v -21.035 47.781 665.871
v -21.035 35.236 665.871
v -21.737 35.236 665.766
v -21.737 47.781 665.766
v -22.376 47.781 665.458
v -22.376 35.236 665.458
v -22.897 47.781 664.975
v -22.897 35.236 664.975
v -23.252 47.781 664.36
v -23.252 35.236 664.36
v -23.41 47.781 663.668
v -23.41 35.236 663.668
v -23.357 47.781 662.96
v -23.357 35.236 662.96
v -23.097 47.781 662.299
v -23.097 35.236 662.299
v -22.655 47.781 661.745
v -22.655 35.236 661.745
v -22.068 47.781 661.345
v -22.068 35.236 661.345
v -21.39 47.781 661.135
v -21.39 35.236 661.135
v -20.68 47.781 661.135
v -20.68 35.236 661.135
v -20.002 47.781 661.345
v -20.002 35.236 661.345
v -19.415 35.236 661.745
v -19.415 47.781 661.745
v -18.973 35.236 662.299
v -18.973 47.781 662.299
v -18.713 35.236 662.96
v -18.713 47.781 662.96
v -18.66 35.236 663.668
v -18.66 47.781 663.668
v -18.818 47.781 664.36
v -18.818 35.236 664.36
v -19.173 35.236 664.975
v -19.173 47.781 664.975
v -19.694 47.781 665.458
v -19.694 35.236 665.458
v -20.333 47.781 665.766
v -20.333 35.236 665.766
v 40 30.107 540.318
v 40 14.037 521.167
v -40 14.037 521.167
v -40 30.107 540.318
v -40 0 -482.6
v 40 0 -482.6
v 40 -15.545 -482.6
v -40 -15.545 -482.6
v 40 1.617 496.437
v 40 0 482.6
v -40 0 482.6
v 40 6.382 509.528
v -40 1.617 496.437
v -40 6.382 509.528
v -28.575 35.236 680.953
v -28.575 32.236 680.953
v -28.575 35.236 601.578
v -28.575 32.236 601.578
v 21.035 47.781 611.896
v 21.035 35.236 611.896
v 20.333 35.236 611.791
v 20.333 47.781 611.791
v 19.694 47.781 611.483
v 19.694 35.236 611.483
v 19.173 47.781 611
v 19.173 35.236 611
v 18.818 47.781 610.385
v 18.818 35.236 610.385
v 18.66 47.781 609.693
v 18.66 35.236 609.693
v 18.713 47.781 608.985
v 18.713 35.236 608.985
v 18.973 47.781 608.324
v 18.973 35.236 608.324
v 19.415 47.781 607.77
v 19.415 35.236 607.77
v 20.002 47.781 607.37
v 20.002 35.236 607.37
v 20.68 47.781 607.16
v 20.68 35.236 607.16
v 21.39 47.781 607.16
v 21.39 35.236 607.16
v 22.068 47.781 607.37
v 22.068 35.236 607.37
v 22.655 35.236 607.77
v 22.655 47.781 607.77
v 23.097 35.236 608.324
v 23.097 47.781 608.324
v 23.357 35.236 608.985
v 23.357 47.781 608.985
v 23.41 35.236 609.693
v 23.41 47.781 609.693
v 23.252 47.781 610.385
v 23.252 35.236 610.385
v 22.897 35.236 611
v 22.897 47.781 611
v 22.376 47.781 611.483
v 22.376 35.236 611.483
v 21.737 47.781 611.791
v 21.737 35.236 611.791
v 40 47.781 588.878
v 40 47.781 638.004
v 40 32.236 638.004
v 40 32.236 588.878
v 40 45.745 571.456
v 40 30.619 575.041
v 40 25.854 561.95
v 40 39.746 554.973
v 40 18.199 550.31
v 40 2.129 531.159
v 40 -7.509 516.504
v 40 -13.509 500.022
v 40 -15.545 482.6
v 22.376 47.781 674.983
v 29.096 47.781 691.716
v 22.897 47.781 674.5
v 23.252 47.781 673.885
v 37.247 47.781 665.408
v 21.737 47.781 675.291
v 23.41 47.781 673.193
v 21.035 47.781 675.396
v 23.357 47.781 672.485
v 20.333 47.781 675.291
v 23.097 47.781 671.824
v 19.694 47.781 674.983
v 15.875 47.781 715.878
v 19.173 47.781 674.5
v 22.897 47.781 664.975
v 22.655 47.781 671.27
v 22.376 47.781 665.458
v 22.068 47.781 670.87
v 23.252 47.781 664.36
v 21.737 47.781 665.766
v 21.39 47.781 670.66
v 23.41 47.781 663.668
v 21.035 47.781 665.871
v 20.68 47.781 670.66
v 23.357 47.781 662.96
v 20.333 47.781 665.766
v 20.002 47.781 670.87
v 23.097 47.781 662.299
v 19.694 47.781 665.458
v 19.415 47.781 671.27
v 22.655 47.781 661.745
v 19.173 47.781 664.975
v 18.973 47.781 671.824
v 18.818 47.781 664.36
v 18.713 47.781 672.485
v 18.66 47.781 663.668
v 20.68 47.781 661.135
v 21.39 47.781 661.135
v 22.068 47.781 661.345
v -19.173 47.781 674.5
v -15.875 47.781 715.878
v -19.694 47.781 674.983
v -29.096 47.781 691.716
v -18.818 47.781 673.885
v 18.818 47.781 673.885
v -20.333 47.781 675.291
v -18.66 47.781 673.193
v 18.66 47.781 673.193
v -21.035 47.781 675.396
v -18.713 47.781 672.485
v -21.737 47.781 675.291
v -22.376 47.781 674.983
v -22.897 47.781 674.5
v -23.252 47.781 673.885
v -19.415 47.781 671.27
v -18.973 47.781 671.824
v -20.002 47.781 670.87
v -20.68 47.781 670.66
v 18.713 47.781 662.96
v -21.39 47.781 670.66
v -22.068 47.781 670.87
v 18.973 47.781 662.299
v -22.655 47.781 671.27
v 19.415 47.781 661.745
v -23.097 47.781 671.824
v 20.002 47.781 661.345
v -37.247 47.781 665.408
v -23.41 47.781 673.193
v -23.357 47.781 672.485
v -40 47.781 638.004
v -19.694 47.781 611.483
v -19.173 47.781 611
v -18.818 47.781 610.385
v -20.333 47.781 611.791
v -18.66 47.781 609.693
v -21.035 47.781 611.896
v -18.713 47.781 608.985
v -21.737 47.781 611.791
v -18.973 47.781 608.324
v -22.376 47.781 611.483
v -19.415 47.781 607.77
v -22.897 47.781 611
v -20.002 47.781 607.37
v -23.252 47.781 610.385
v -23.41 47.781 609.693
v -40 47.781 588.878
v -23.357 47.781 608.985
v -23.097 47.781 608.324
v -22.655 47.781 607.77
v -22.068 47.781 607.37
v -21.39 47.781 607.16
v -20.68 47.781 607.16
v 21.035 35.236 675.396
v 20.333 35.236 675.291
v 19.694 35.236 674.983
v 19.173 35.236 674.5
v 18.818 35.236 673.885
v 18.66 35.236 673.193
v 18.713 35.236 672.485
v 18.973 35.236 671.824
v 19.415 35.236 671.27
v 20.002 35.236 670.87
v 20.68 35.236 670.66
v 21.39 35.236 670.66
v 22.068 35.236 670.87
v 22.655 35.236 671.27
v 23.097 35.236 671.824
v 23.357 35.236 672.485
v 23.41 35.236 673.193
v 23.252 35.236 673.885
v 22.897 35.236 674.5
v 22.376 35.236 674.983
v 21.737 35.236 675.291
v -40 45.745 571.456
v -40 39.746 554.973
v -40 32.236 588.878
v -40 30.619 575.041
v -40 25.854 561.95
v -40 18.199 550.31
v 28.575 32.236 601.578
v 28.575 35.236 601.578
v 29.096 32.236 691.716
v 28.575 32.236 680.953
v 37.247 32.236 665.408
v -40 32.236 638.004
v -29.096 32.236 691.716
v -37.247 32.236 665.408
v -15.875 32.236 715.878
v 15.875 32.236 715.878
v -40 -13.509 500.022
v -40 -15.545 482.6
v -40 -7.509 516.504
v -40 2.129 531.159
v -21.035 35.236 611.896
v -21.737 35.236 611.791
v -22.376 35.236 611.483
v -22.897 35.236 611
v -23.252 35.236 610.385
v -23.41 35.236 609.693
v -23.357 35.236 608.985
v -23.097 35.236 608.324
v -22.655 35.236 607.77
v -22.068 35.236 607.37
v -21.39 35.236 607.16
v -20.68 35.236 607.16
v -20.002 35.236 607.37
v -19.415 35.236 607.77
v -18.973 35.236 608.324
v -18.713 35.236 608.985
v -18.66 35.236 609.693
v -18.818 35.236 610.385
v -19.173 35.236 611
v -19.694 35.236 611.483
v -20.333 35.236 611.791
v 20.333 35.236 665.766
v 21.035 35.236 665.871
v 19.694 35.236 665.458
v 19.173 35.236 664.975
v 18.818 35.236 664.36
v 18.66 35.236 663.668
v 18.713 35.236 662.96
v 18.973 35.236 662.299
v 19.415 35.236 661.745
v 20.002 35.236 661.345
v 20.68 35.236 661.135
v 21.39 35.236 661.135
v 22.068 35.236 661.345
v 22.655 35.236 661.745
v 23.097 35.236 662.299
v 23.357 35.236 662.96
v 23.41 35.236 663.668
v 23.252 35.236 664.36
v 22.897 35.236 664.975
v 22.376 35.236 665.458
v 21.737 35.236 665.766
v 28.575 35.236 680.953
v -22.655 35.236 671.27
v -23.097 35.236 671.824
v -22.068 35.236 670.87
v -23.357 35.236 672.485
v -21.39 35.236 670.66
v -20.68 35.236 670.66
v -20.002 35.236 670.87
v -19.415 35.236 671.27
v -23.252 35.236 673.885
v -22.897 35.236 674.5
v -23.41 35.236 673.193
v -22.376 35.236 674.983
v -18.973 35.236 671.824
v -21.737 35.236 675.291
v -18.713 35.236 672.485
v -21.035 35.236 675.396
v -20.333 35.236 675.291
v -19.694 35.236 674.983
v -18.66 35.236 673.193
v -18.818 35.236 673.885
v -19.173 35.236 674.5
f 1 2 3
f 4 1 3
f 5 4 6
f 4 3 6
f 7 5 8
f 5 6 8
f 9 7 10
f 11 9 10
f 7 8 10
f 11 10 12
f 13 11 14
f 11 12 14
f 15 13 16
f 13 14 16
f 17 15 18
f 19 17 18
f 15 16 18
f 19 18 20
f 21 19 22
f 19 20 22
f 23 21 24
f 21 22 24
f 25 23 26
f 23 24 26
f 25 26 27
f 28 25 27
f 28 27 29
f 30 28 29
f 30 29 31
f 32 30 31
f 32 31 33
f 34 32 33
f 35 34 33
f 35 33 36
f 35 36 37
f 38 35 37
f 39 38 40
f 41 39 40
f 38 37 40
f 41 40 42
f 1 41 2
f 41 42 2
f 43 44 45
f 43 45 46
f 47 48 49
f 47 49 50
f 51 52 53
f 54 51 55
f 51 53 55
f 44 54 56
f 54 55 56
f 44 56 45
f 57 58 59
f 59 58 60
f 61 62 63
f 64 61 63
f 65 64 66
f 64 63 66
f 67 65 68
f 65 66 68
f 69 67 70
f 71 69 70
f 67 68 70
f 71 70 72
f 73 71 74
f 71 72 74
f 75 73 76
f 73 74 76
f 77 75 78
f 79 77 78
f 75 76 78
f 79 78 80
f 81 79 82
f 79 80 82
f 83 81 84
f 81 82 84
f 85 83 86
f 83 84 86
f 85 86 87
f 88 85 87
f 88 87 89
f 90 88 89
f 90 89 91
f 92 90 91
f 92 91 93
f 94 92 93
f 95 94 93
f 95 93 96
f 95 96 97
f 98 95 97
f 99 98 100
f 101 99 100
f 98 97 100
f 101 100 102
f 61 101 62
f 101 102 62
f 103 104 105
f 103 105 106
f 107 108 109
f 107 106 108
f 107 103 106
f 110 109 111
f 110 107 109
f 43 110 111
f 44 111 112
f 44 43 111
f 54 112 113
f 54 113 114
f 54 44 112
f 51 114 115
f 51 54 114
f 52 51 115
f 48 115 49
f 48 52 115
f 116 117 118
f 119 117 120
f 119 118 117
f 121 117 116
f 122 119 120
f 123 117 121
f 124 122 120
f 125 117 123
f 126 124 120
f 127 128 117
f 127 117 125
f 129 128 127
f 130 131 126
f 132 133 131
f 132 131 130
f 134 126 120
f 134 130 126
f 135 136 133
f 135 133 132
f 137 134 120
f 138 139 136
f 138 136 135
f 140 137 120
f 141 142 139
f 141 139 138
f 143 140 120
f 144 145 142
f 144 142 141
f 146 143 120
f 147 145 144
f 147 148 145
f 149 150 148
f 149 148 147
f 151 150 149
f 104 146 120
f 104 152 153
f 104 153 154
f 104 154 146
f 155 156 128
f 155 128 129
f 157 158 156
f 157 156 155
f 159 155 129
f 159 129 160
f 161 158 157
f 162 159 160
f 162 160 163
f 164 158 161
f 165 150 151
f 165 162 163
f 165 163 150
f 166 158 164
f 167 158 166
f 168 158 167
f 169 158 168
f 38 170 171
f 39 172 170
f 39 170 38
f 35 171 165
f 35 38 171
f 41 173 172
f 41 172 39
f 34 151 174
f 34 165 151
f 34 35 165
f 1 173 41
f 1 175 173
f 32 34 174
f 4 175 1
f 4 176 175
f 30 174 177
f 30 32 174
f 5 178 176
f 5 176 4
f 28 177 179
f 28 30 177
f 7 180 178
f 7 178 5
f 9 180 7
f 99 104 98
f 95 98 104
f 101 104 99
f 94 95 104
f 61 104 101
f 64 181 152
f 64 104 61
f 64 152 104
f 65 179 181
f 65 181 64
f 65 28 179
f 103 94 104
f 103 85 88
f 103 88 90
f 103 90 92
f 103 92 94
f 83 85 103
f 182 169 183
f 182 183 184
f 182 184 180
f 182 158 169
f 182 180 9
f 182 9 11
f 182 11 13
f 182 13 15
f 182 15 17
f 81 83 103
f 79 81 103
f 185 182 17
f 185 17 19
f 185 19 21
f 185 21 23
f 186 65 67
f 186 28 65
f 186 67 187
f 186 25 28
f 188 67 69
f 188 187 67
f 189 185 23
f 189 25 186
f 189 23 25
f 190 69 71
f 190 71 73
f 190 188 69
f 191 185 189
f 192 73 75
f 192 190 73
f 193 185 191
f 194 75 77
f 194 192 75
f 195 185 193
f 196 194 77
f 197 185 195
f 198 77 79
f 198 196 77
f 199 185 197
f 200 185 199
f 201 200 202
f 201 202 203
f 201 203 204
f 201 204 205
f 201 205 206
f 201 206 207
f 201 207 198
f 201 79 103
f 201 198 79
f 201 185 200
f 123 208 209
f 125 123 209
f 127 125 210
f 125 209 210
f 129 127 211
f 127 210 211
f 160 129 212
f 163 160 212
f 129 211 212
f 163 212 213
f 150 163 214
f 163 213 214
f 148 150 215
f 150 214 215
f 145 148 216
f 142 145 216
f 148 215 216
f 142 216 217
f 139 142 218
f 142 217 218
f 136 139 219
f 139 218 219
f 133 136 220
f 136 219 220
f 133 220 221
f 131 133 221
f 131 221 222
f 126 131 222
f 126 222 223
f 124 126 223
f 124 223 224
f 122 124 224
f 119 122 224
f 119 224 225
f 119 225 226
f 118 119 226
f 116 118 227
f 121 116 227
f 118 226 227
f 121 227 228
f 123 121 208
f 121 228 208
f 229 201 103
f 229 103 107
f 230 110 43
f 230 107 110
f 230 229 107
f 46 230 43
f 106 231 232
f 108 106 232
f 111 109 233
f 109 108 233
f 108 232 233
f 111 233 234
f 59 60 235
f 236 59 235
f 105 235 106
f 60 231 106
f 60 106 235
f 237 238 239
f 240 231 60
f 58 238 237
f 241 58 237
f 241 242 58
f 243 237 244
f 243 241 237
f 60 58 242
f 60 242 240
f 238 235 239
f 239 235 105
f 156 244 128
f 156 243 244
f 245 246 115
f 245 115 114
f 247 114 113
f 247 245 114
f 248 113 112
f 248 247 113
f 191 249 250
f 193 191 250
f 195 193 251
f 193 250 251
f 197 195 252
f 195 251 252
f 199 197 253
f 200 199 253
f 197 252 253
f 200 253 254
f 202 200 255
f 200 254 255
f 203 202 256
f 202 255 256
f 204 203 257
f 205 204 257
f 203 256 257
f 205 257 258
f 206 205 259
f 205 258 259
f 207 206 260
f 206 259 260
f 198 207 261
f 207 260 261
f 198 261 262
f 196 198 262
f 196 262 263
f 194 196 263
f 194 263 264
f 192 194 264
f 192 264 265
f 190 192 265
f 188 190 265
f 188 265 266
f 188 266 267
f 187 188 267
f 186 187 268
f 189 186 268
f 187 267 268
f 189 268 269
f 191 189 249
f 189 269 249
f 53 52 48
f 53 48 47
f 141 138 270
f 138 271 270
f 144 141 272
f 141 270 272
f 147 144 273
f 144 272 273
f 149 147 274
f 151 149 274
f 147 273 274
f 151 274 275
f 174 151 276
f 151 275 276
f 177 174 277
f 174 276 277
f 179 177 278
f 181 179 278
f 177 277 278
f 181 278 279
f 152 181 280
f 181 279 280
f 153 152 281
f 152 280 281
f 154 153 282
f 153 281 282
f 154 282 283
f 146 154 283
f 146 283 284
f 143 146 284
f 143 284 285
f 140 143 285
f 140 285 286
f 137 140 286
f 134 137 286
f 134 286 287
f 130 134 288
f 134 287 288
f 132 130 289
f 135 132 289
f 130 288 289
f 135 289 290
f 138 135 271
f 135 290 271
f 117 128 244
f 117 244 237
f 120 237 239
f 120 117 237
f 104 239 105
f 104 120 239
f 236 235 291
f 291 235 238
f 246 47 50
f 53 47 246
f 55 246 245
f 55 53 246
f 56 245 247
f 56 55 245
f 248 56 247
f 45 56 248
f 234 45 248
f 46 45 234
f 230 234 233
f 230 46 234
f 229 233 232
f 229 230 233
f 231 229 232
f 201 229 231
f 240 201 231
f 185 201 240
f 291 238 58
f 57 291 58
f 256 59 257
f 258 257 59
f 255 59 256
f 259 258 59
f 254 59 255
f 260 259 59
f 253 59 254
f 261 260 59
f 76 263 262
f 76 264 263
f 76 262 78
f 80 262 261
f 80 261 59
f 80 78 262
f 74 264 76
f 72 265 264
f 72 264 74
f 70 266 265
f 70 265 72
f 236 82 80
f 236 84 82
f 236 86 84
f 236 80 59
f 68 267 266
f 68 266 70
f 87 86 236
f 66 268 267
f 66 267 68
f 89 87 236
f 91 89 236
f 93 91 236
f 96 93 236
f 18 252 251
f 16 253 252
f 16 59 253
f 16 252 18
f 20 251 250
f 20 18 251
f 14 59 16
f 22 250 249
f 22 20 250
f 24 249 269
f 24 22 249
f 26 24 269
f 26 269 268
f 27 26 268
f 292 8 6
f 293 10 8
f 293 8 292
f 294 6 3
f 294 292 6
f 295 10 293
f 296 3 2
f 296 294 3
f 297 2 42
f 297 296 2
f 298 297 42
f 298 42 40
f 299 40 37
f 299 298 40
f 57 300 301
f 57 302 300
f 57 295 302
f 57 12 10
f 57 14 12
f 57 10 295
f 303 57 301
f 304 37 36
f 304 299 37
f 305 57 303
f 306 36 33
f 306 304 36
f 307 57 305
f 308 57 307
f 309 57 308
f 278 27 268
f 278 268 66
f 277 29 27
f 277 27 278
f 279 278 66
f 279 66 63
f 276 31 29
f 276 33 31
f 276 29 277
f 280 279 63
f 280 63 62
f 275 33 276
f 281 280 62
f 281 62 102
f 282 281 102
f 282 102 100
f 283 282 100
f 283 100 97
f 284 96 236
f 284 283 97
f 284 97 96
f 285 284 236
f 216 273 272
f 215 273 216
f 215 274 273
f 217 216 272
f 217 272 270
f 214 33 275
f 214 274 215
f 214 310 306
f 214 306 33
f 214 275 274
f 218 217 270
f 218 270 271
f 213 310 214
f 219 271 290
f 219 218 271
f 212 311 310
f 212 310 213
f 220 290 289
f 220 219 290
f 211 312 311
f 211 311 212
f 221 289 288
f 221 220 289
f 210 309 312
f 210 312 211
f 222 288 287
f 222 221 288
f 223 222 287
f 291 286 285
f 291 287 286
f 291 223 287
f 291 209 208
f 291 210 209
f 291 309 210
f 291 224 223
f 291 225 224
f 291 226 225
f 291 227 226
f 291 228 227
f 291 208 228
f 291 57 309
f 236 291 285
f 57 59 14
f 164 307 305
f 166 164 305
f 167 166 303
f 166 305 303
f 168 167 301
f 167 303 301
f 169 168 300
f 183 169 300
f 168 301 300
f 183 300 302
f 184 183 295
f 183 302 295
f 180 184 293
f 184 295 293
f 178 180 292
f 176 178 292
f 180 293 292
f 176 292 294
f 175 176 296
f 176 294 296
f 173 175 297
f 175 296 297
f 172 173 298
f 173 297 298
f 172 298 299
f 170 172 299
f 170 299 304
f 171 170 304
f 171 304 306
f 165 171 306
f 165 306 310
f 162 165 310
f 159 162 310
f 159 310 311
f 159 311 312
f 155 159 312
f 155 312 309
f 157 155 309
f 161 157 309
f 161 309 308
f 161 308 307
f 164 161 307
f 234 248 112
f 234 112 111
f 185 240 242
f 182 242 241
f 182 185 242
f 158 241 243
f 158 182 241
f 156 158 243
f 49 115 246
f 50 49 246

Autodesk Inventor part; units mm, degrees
ref_plane "YZ Plane" through (0, 0, 0) normal (1, 0, 0) x (0, 1, 0)
ref_plane "XZ Plane" through (0, 0, 0) normal (0, 1, 0) x (-1, 0, 0)
ref_plane "XY Plane" through (0, 0, 0) normal (0, 0, 1) x (1, 0, 0)
sketch "Sketch1" plane through (0, 0, 0) normal (0, 1, 0) x (-1, 0, 0)
  line L0 (-40, 482.6) -> (-40, -482.6)
  line L1 (-40, -482.6) -> (40, -482.6)
  line L2 (40, -482.6) -> (40, 482.6)
  line L3 (40, 482.6) -> (-40, 482.6)
  line L4 (-40, 482.6) -> (40, -482.6) construction
  line L5 (-40, -482.6) -> (40, 482.6) construction
  point P0 (0, 0)
  dimension "d0" = 965.2
  dimension "d1" = 80
extrude "Extrusion1" add sketch "Sketch1" against normal blind 15.5448
ref_plane "Work Plane1" through (0, 0, 482.6) normal (1, 0, 0) x (0, 1, 0)
sketch "Sketch2" plane through (0, 0, 482.6) normal (1, 0, 0) x (0, 1, 0)
  line L0 (0, -965.2) -> (0, 0) projected
  line L1 (0, -965.2) -> (-15.5448, -965.2) projected
  line L2 (-15.5448, 0) -> (-15.5448, -965.2) projected
  line L3 (0, 0) -> (-15.5448, 0) projected
  line L4 (41.9902, -1050.1493) -> (41.9902, -1135.1493)
  line L5 (57.0671, -1050.1493) -> (57.0671, -1135.1493)
  line L6 (57.0671, -1135.1493) -> (41.9902, -1135.1493)
  line L7 (41.9902, -1092.6493) -> (57.0671, -1092.6493) construction
  line L8 (-15.5448, 0) -> (-15.5448, -965.2) construction
  line L9 (-15.5448, -965.2) -> (-15.5448, -1004.6981) construction
  line L10 (-15.5448, -1004.6981) -> (41.9902, -1021.6042) construction
  line L11 (41.9902, -1021.6042) -> (41.9902, -1050.1493) construction
  spline S0 degree 3 poles (-15.5448, -965.2) (-15.5448, -1004.6981) (41.9902, -1021.6042) (41.9902, -1050.1493) knots 1 1 1 1 2 2 2 2
  line L12 (57.0671, -1050.1493) -> (57.0671, -1021.6042) construction
  line L13 (57.0671, -1021.6042) -> (0, -1003.1803) construction
  line L14 (0, -965.2) -> (0, 0) construction
  line L15 (0, -1003.1803) -> (0, -965.2) construction
  spline S1 degree 3 poles (57.0671, -1050.1493) (57.0671, -1021.6042) (0, -1003.1803) (0, -965.2) knots 1 1 1 1 2 2 2 2
  point P0 (0, -482.6)
  dimension "d4" = 85
  dimension "d5" = 15.0769
sketch "Sketch3" plane through (0, 0, 482.6) normal (1, 0, 0) x (0, 1, 0)
  line L0 (0, 0) -> (0, -965.2) projected
  line L1 (0, 0) -> (-15.5448, 0) projected
  line L2 (-15.5448, -965.2) -> (-15.5448, 0) projected
  line L3 (0, -965.2) -> (-15.5448, -965.2) projected
  arc A0 (2.1293, 48.5593) -> (-15.5448, 0) centre (60, 0) ccw
  arc A1 (14.0373, 38.5673) -> (0, 0) centre (60, 0) ccw
  line L4 (2.1293, 48.5593) -> (18.199, 67.7104)
  line L5 (0, 0) -> (-15.5448, 0) construction
  line L6 (2.1293, 48.5593) -> (14.0373, 38.5673) construction
  line L7 (14.0373, 38.5673) -> (30.107, 57.7184)
  arc A2 (18.199, 67.7104) -> (32.2363, 106.2776) centre (-27.7637, 106.2776) ccw
  arc A3 (30.107, 57.7184) -> (47.7811, 106.2776) centre (-27.7637, 106.2776) ccw
  line L8 (32.2363, 106.2776) -> (32.2363, 233.2776)
  line L9 (32.2363, 233.2776) -> (47.7811, 233.2776)
  line L10 (47.7811, 233.2776) -> (47.7811, 106.2776)
  line L11 (30.107, 57.7184) -> (18.199, 67.7104) construction
  line L12 (32.2363, 106.2776) -> (47.7811, 106.2776) construction
  point P0 (0, -482.6)
  dimension "d17" = 127
  dimension "d18" = 140
  dimension "d19" = 60
  dimension "d21" = 140
  dimension "d22" = 25
extrude "Extrusion2" add sketch "Sketch3" along normal up to surface (80 mm away) from surface at -40 contours L1 A0 L4 A2 L8 L9 L10 A3 L7 A1
sketch "Sketch9" plane through (-40, 47.7811, 588.8776) normal (0, 1, 0) x (1, 0, 0)
  line L0 (0, -127) -> (0, 0) construction
  line L1 (0, 0) -> (0, -127) construction
  line L2 (80, -127) -> (80, 0) construction
  line L3 (0, -127) -> (0, -49.1262)
  line L4 (80, 0) -> (80, -127) projected
  line L5 (80, -49.1262) -> (80, -127)
  arc A0 (0, -49.1262) -> (24.125, -127) centre (137.7482, -49.1262) ccw
  arc A1 (55.875, -127) -> (80, -49.1262) centre (-57.7482, -49.1262) ccw
  line L6 (24.125, -127) -> (55.875, -127)
  line L7 (0, -127) -> (80, -127) projected
  line L8 (55.875, -127) -> (80, -127)
  line L9 (80, -127) -> (80, -49.1262)
  line L10 (0, -127) -> (24.125, -127)
  line L11 (55.875, -127) -> (80, -127)
  line L12 (24.125, -127) -> (0, -127)
  point P0 (40, 588.8776)
  dimension "d41" = 31.75
sketch "Sketch10" plane through (-40, 47.7811, 588.8776) normal (0, 1, 0) x (1, 0, 0)
  line L0 (11.425, -92.075) -> (68.575, -92.075) construction
  line L1 (68.575, -92.075) -> (68.575, -12.7) construction
  line L2 (68.575, -12.7) -> (11.425, -12.7) construction
  line L3 (11.425, -12.7) -> (11.425, -92.075) construction
  line L4 (11.425, -92.075) -> (68.575, -12.7) construction
  line L5 (68.575, -92.075) -> (11.425, -12.7) construction
  line L6 (12.6315, -90.043) -> (67.3685, -90.043)
  line L7 (67.3685, -90.043) -> (67.3685, -14.732)
  line L8 (67.3685, -14.732) -> (12.6315, -14.732)
  line L9 (12.6315, -14.732) -> (12.6315, -90.043)
  line L10 (12.6315, -90.043) -> (67.3685, -14.732) construction
  line L11 (67.3685, -90.043) -> (12.6315, -14.732) construction
  line L12 (18.965, -84.1375) -> (61.035, -84.1375) construction
  line L13 (61.035, -84.1375) -> (61.035, -20.6375) construction
  line L14 (61.035, -20.6375) -> (18.965, -20.6375) construction
  line L15 (18.965, -20.6375) -> (18.965, -84.1375) construction
  line L16 (18.965, -84.1375) -> (61.035, -20.6375) construction
  line L17 (61.035, -84.1375) -> (18.965, -20.6375) construction
  line L18 (18.965, -84.1375) -> (61.035, -84.1375) construction
  line L19 (61.035, -84.1375) -> (61.035, -74.6125) construction
  line L20 (61.035, -74.6125) -> (18.965, -74.6125) construction
  line L21 (18.965, -74.6125) -> (18.965, -84.1375) construction
  line L22 (68.575, -12.7) -> (80, -12.7) construction
  line L23 (11.425, -12.7) -> (0, -12.7) construction
  line L24 (0, -127) -> (0, 0) construction
  line L25 (80, -127) -> (80, 0) projected
  line L26 (0, 0) -> (80, 0) projected
  point P0 (40, 588.8776)
  point P1 (40, -52.3875)
  dimension "d33" = 57.15
  dimension "d34" = 79.375
  dimension "d35" = 54.737
  dimension "d36" = 75.311
  dimension "d37" = 42.07
  dimension "d38" = 63.5
  dimension "d39" = 9.525
  dimension "d40" = 12.7
extrude "Extrusion7" cut sketch "Sketch9" against normal through all
hole "Hole1" at (-21.035, 47.7811, 673.0151) at (-21.035, 47.7811, 663.4901) at (21.035, 47.7811, 673.0151) at (21.035, 47.7811, 663.4901) at (21.035, 47.7811, 609.5151) at (-21.035, 47.7811, 609.5151) direction (0, -1, 0) diameter 4.7625 end through all
sketch "Sketch11" plane through (-40, 32.2363, 588.8776) normal (0, -1, 0) x (1, 0, 0)
  line L0 (11.425, 92.075) -> (68.575, 92.075) construction
  line L1 (11.425, 12.7) -> (11.425, 92.075) construction
  line L2 (68.575, 92.075) -> (68.575, 12.7) construction
  line L3 (11.425, 12.7) -> (68.575, 12.7)
  line L4 (68.575, 12.7) -> (68.575, 92.075)
  line L5 (68.575, 92.075) -> (11.425, 92.075)
  line L6 (11.425, 92.075) -> (11.425, 12.7)
  line L7 (11.425, 12.7) -> (68.575, 92.075) construction
  line L8 (68.575, 12.7) -> (11.425, 92.075) construction
  point P0 (40, -588.8776)
  point P1 (40, 52.3875)
extrude "Extrusion8" cut sketch "Sketch11" against normal blind 3
properties part number "Metal Middle" material "Aluminum 6061"
